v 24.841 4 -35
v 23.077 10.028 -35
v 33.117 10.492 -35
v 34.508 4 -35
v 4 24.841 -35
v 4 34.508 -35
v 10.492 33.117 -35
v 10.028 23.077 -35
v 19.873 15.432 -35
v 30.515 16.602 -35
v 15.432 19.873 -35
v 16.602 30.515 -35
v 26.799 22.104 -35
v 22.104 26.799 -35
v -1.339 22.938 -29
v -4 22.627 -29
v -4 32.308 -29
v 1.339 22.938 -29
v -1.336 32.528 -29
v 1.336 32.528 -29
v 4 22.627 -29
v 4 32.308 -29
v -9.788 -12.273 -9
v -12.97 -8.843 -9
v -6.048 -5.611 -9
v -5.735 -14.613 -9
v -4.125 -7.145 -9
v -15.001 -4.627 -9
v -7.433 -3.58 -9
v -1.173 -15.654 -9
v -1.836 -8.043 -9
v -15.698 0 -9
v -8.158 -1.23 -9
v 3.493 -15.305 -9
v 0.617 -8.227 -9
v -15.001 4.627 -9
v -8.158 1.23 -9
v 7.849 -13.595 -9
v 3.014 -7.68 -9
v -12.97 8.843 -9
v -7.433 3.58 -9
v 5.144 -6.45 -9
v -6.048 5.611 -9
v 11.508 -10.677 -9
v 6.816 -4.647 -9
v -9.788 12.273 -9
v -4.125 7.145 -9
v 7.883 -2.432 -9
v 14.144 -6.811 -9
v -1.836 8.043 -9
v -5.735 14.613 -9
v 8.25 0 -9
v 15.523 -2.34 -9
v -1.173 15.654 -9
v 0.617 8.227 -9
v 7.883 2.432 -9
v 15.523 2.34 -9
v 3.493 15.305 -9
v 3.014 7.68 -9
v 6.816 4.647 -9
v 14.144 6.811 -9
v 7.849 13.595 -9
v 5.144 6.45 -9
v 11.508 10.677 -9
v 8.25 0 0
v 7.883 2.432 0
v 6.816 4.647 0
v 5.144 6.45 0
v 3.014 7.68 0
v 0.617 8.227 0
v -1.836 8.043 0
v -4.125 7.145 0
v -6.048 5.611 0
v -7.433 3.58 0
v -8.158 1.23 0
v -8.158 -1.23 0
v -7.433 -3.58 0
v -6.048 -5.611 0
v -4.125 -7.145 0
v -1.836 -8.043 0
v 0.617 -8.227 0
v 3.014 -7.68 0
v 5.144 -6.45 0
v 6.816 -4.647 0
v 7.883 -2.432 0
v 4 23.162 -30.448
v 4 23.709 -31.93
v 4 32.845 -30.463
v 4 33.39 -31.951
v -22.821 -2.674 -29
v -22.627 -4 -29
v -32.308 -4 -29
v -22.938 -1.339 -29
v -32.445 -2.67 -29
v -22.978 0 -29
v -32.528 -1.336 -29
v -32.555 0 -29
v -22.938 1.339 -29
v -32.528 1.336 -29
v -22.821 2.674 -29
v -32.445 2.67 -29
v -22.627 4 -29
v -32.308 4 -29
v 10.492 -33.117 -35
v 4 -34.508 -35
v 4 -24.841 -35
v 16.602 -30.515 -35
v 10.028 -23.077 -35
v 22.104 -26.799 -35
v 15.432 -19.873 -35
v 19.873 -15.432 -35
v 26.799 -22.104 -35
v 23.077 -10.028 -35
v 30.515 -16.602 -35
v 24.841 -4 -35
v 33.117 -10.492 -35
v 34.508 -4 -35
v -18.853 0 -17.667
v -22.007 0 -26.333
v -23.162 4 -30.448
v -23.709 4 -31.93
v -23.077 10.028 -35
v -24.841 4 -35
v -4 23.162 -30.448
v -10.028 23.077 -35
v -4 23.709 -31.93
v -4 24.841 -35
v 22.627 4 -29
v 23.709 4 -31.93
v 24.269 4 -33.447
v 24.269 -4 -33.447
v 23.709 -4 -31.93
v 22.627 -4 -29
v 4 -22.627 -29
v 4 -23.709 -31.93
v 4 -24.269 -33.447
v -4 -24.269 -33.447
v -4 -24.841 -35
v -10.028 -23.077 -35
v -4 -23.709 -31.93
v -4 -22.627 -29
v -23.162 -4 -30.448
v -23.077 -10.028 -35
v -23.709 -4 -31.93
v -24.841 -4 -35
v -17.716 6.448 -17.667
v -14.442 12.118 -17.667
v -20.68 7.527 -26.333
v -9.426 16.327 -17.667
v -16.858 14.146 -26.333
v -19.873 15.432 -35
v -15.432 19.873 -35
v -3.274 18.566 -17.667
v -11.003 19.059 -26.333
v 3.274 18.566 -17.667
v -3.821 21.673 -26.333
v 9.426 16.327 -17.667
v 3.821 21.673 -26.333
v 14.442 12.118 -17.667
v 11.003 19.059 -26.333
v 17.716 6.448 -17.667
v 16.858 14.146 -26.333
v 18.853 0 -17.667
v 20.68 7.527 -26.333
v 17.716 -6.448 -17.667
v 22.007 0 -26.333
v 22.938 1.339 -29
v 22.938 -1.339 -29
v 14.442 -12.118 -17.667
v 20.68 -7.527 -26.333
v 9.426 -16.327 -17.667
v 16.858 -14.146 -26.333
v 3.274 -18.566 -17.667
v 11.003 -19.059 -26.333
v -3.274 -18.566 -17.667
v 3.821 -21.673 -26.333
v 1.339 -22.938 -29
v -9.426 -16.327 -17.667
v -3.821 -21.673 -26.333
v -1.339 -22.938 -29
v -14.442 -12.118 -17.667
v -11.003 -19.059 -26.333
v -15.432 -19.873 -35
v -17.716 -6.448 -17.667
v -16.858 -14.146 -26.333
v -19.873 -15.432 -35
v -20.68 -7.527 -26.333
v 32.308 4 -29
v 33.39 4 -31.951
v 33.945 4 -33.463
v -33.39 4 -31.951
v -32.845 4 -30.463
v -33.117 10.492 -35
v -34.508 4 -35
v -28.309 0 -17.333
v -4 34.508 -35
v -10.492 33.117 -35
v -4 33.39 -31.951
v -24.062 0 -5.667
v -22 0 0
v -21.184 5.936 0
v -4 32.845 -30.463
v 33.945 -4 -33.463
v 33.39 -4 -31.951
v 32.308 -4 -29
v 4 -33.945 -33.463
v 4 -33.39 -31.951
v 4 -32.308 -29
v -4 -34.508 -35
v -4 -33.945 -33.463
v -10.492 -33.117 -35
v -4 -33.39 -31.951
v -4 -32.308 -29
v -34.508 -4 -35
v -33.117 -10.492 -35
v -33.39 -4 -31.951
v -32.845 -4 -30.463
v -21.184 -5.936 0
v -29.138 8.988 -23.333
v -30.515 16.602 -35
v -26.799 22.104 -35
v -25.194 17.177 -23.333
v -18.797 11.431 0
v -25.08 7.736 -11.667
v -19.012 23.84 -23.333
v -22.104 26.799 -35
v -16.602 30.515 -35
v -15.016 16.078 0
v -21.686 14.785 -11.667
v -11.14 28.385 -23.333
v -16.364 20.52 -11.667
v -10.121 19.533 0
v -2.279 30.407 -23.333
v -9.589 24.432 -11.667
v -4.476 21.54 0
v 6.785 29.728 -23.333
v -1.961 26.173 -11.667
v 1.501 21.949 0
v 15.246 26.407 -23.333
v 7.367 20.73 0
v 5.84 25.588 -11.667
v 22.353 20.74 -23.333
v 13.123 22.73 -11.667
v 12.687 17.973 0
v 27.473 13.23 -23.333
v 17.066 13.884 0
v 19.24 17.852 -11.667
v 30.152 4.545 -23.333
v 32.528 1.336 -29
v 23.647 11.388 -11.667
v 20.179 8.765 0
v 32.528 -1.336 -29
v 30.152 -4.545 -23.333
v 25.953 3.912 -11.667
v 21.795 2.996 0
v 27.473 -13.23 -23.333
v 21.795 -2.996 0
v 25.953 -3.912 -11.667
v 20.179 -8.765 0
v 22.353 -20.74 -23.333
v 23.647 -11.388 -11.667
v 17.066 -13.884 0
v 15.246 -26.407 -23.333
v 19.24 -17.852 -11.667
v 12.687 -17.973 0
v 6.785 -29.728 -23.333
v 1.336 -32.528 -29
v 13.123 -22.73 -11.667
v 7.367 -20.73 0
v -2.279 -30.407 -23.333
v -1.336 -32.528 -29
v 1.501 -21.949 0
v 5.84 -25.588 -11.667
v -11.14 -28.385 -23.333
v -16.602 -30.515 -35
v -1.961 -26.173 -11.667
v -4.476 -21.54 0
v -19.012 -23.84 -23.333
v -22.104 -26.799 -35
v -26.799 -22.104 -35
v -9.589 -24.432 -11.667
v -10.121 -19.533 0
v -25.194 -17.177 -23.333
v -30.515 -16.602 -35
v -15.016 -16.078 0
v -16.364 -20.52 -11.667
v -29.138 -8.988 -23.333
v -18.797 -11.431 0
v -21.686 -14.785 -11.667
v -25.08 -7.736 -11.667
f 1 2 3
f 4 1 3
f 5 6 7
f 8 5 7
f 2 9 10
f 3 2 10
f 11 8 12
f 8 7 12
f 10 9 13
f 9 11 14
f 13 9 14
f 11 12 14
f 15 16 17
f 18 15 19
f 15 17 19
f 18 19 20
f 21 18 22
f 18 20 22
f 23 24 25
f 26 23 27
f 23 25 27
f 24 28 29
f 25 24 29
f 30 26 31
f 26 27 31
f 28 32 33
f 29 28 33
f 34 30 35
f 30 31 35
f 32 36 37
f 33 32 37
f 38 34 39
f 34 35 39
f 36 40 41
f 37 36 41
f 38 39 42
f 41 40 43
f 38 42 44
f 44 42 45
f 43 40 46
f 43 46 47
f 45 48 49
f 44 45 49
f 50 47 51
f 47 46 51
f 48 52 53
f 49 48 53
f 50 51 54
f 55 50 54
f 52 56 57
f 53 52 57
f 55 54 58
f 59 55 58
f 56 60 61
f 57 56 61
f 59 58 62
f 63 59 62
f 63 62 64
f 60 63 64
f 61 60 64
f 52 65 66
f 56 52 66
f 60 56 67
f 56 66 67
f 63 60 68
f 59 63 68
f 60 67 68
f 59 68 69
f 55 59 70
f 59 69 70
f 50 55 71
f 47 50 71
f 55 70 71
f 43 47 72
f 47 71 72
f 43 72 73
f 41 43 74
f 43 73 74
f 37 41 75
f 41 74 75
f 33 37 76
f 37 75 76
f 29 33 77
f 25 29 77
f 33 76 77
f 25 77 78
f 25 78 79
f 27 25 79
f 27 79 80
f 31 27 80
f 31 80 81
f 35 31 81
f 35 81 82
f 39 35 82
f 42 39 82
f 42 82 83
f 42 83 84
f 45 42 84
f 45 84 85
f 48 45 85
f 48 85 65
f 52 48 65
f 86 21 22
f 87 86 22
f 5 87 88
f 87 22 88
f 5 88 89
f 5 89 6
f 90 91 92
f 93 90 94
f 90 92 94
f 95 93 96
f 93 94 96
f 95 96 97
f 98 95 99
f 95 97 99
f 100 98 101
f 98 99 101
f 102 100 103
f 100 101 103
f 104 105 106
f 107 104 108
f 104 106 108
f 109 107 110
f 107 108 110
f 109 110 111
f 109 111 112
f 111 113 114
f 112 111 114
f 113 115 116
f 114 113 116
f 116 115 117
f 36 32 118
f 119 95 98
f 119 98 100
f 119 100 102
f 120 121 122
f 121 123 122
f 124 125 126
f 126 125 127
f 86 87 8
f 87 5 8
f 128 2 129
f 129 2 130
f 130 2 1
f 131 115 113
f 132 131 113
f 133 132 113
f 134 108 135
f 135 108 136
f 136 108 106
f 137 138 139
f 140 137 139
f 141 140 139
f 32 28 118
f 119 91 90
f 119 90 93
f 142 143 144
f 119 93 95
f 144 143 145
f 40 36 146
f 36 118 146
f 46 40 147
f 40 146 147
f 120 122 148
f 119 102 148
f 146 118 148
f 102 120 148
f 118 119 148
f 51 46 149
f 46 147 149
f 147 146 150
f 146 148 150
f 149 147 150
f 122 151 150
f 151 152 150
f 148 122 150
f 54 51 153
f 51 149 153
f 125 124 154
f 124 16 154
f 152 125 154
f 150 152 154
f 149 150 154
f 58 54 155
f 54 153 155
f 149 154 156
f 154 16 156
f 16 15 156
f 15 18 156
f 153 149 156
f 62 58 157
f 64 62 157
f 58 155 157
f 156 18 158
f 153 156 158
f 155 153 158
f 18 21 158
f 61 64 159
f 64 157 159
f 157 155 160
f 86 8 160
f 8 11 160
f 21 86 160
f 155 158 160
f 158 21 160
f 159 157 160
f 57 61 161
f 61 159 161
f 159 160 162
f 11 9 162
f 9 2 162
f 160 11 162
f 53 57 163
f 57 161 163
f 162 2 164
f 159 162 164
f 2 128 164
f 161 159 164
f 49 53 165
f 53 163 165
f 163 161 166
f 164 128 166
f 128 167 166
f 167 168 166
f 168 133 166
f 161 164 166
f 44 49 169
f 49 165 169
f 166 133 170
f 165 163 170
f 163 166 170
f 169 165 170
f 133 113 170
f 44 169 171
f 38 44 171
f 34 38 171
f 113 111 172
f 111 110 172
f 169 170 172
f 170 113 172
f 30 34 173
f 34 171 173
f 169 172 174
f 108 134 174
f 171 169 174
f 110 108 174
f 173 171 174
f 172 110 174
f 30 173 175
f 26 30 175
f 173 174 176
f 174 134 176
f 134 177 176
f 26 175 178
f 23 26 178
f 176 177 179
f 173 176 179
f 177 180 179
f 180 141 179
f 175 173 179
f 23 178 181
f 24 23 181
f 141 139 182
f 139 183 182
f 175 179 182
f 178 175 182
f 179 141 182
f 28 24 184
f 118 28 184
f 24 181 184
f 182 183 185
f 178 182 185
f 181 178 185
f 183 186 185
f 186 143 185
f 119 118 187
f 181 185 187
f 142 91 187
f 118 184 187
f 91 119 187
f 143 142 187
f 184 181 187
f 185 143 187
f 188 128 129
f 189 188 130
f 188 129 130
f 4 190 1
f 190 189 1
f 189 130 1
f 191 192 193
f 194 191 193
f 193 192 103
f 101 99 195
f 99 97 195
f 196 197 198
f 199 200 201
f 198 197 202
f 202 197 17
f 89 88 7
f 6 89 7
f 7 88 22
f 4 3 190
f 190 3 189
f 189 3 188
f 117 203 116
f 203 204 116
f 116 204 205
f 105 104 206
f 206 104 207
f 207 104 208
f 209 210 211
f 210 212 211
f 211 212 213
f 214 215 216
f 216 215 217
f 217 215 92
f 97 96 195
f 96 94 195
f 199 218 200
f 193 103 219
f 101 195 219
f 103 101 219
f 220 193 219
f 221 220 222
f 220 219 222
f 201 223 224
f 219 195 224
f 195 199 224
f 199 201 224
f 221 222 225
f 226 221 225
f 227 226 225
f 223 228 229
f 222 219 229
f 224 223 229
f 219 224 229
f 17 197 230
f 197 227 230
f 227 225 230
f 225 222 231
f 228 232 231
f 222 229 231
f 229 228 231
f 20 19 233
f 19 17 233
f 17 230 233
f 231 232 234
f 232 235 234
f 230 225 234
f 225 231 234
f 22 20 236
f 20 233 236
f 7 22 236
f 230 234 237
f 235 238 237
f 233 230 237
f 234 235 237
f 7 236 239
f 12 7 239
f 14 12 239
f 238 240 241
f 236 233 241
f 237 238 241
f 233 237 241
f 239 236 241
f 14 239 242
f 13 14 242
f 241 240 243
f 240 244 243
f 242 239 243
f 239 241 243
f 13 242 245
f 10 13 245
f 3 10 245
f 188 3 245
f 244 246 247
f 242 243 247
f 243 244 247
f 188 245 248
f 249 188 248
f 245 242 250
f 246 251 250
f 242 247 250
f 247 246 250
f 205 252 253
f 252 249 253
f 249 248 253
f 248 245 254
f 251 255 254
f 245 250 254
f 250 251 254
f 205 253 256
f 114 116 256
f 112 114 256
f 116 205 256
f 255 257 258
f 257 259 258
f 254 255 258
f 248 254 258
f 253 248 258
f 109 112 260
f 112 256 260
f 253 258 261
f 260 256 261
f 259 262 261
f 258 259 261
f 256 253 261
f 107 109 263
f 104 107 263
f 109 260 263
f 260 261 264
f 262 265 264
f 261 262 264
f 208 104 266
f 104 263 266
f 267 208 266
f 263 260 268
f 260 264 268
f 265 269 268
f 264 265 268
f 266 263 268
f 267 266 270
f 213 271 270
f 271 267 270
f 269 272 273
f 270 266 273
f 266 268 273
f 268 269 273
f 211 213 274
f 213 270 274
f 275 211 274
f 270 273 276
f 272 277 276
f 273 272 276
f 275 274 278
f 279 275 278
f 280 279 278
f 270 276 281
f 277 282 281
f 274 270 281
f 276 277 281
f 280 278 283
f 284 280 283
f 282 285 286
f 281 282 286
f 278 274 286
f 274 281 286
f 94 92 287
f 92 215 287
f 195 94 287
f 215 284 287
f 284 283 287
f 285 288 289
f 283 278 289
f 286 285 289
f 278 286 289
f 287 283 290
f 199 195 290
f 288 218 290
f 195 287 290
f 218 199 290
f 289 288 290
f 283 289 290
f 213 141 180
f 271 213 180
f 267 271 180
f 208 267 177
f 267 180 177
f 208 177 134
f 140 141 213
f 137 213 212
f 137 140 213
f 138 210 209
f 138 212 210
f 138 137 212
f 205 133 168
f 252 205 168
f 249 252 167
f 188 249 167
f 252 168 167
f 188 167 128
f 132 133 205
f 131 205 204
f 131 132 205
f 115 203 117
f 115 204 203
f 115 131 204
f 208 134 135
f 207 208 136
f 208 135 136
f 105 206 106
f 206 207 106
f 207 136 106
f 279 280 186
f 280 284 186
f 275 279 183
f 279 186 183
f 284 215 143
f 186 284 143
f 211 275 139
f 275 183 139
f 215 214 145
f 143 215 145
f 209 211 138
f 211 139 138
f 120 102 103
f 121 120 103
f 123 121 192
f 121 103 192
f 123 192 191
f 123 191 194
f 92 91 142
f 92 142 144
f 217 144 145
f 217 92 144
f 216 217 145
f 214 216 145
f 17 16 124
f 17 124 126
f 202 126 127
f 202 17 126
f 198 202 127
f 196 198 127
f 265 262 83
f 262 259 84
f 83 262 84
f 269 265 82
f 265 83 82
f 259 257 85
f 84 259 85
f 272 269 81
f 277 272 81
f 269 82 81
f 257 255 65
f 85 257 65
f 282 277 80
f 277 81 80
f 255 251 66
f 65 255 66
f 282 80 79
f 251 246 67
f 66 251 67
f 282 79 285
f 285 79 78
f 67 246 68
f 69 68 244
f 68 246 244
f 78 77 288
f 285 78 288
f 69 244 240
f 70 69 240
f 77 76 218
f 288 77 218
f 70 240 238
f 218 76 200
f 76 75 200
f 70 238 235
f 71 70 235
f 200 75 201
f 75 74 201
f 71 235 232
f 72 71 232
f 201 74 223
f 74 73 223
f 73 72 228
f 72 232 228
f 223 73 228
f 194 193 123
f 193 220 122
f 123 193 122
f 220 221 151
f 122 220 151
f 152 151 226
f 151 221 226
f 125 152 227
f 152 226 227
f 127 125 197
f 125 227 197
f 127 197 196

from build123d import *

# Parameters (mm, degrees)
CUT_EXTRUDE_1_REACH      = 37
SKETCH_2_R               = 8.25
SKETCH_3_W               = 8
SKETCH_3_H               = 6
CUT_EXTRUDE_2_DEPTH      = 35.738958199
PATTERN_CIRCULAR_1_COUNT = 4


with BuildPart() as part:
    # 草图1 → 旋转1 (revolve)
    with BuildSketch(Plane(origin=(0, 0, 0), x_dir=(1, 0, 0), z_dir=(0, 1, 0))):
        Polygon((-22, 0), (0, 0), (0, 9), (-15.698132156, 9), (-25.161358247, 35), (-34.738958199, 35), align=None)
    revolve(axis=Axis((0, 0, 0), (0, 0, -1)))

    # 草图2 → 切除-拉伸1 (cut, up to next)
    with BuildSketch(Plane.XY, mode=Mode.PRIVATE) as cut_extrude_1_sk1:
        Circle(SKETCH_2_R)
    cut_extrude_1_tool1 = extrude(cut_extrude_1_sk1.sketch, amount=-CUT_EXTRUDE_1_REACH, mode=Mode.PRIVATE) & part.part
    add(cut_extrude_1_tool1.solids().sort_by_distance((0, 0, 0))[0], mode=Mode.SUBTRACT)

    # 草图3 → 切除-拉伸2 (cut, symmetric)
    with BuildSketch(Plane(origin=(0, 0, 0), x_dir=(1, 0, 0), z_dir=(0, 1, 0))):
        with Locations((0, 32)):
            Rectangle(SKETCH_3_W, SKETCH_3_H)
    cut_extrude_2 = extrude(amount=CUT_EXTRUDE_2_DEPTH, both=True, mode=Mode.SUBTRACT)

    # 阵列(圆周)1: 切除-拉伸2 ×4 about axis
    pattern_circular_1_axis = Axis((0, 0, 0), (0, 0, 1))
    for i in range(1, PATTERN_CIRCULAR_1_COUNT):
        add(cut_extrude_2.rotate(pattern_circular_1_axis, i * 360 / PATTERN_CIRCULAR_1_COUNT), mode=Mode.SUBTRACT)


solid = part.part
